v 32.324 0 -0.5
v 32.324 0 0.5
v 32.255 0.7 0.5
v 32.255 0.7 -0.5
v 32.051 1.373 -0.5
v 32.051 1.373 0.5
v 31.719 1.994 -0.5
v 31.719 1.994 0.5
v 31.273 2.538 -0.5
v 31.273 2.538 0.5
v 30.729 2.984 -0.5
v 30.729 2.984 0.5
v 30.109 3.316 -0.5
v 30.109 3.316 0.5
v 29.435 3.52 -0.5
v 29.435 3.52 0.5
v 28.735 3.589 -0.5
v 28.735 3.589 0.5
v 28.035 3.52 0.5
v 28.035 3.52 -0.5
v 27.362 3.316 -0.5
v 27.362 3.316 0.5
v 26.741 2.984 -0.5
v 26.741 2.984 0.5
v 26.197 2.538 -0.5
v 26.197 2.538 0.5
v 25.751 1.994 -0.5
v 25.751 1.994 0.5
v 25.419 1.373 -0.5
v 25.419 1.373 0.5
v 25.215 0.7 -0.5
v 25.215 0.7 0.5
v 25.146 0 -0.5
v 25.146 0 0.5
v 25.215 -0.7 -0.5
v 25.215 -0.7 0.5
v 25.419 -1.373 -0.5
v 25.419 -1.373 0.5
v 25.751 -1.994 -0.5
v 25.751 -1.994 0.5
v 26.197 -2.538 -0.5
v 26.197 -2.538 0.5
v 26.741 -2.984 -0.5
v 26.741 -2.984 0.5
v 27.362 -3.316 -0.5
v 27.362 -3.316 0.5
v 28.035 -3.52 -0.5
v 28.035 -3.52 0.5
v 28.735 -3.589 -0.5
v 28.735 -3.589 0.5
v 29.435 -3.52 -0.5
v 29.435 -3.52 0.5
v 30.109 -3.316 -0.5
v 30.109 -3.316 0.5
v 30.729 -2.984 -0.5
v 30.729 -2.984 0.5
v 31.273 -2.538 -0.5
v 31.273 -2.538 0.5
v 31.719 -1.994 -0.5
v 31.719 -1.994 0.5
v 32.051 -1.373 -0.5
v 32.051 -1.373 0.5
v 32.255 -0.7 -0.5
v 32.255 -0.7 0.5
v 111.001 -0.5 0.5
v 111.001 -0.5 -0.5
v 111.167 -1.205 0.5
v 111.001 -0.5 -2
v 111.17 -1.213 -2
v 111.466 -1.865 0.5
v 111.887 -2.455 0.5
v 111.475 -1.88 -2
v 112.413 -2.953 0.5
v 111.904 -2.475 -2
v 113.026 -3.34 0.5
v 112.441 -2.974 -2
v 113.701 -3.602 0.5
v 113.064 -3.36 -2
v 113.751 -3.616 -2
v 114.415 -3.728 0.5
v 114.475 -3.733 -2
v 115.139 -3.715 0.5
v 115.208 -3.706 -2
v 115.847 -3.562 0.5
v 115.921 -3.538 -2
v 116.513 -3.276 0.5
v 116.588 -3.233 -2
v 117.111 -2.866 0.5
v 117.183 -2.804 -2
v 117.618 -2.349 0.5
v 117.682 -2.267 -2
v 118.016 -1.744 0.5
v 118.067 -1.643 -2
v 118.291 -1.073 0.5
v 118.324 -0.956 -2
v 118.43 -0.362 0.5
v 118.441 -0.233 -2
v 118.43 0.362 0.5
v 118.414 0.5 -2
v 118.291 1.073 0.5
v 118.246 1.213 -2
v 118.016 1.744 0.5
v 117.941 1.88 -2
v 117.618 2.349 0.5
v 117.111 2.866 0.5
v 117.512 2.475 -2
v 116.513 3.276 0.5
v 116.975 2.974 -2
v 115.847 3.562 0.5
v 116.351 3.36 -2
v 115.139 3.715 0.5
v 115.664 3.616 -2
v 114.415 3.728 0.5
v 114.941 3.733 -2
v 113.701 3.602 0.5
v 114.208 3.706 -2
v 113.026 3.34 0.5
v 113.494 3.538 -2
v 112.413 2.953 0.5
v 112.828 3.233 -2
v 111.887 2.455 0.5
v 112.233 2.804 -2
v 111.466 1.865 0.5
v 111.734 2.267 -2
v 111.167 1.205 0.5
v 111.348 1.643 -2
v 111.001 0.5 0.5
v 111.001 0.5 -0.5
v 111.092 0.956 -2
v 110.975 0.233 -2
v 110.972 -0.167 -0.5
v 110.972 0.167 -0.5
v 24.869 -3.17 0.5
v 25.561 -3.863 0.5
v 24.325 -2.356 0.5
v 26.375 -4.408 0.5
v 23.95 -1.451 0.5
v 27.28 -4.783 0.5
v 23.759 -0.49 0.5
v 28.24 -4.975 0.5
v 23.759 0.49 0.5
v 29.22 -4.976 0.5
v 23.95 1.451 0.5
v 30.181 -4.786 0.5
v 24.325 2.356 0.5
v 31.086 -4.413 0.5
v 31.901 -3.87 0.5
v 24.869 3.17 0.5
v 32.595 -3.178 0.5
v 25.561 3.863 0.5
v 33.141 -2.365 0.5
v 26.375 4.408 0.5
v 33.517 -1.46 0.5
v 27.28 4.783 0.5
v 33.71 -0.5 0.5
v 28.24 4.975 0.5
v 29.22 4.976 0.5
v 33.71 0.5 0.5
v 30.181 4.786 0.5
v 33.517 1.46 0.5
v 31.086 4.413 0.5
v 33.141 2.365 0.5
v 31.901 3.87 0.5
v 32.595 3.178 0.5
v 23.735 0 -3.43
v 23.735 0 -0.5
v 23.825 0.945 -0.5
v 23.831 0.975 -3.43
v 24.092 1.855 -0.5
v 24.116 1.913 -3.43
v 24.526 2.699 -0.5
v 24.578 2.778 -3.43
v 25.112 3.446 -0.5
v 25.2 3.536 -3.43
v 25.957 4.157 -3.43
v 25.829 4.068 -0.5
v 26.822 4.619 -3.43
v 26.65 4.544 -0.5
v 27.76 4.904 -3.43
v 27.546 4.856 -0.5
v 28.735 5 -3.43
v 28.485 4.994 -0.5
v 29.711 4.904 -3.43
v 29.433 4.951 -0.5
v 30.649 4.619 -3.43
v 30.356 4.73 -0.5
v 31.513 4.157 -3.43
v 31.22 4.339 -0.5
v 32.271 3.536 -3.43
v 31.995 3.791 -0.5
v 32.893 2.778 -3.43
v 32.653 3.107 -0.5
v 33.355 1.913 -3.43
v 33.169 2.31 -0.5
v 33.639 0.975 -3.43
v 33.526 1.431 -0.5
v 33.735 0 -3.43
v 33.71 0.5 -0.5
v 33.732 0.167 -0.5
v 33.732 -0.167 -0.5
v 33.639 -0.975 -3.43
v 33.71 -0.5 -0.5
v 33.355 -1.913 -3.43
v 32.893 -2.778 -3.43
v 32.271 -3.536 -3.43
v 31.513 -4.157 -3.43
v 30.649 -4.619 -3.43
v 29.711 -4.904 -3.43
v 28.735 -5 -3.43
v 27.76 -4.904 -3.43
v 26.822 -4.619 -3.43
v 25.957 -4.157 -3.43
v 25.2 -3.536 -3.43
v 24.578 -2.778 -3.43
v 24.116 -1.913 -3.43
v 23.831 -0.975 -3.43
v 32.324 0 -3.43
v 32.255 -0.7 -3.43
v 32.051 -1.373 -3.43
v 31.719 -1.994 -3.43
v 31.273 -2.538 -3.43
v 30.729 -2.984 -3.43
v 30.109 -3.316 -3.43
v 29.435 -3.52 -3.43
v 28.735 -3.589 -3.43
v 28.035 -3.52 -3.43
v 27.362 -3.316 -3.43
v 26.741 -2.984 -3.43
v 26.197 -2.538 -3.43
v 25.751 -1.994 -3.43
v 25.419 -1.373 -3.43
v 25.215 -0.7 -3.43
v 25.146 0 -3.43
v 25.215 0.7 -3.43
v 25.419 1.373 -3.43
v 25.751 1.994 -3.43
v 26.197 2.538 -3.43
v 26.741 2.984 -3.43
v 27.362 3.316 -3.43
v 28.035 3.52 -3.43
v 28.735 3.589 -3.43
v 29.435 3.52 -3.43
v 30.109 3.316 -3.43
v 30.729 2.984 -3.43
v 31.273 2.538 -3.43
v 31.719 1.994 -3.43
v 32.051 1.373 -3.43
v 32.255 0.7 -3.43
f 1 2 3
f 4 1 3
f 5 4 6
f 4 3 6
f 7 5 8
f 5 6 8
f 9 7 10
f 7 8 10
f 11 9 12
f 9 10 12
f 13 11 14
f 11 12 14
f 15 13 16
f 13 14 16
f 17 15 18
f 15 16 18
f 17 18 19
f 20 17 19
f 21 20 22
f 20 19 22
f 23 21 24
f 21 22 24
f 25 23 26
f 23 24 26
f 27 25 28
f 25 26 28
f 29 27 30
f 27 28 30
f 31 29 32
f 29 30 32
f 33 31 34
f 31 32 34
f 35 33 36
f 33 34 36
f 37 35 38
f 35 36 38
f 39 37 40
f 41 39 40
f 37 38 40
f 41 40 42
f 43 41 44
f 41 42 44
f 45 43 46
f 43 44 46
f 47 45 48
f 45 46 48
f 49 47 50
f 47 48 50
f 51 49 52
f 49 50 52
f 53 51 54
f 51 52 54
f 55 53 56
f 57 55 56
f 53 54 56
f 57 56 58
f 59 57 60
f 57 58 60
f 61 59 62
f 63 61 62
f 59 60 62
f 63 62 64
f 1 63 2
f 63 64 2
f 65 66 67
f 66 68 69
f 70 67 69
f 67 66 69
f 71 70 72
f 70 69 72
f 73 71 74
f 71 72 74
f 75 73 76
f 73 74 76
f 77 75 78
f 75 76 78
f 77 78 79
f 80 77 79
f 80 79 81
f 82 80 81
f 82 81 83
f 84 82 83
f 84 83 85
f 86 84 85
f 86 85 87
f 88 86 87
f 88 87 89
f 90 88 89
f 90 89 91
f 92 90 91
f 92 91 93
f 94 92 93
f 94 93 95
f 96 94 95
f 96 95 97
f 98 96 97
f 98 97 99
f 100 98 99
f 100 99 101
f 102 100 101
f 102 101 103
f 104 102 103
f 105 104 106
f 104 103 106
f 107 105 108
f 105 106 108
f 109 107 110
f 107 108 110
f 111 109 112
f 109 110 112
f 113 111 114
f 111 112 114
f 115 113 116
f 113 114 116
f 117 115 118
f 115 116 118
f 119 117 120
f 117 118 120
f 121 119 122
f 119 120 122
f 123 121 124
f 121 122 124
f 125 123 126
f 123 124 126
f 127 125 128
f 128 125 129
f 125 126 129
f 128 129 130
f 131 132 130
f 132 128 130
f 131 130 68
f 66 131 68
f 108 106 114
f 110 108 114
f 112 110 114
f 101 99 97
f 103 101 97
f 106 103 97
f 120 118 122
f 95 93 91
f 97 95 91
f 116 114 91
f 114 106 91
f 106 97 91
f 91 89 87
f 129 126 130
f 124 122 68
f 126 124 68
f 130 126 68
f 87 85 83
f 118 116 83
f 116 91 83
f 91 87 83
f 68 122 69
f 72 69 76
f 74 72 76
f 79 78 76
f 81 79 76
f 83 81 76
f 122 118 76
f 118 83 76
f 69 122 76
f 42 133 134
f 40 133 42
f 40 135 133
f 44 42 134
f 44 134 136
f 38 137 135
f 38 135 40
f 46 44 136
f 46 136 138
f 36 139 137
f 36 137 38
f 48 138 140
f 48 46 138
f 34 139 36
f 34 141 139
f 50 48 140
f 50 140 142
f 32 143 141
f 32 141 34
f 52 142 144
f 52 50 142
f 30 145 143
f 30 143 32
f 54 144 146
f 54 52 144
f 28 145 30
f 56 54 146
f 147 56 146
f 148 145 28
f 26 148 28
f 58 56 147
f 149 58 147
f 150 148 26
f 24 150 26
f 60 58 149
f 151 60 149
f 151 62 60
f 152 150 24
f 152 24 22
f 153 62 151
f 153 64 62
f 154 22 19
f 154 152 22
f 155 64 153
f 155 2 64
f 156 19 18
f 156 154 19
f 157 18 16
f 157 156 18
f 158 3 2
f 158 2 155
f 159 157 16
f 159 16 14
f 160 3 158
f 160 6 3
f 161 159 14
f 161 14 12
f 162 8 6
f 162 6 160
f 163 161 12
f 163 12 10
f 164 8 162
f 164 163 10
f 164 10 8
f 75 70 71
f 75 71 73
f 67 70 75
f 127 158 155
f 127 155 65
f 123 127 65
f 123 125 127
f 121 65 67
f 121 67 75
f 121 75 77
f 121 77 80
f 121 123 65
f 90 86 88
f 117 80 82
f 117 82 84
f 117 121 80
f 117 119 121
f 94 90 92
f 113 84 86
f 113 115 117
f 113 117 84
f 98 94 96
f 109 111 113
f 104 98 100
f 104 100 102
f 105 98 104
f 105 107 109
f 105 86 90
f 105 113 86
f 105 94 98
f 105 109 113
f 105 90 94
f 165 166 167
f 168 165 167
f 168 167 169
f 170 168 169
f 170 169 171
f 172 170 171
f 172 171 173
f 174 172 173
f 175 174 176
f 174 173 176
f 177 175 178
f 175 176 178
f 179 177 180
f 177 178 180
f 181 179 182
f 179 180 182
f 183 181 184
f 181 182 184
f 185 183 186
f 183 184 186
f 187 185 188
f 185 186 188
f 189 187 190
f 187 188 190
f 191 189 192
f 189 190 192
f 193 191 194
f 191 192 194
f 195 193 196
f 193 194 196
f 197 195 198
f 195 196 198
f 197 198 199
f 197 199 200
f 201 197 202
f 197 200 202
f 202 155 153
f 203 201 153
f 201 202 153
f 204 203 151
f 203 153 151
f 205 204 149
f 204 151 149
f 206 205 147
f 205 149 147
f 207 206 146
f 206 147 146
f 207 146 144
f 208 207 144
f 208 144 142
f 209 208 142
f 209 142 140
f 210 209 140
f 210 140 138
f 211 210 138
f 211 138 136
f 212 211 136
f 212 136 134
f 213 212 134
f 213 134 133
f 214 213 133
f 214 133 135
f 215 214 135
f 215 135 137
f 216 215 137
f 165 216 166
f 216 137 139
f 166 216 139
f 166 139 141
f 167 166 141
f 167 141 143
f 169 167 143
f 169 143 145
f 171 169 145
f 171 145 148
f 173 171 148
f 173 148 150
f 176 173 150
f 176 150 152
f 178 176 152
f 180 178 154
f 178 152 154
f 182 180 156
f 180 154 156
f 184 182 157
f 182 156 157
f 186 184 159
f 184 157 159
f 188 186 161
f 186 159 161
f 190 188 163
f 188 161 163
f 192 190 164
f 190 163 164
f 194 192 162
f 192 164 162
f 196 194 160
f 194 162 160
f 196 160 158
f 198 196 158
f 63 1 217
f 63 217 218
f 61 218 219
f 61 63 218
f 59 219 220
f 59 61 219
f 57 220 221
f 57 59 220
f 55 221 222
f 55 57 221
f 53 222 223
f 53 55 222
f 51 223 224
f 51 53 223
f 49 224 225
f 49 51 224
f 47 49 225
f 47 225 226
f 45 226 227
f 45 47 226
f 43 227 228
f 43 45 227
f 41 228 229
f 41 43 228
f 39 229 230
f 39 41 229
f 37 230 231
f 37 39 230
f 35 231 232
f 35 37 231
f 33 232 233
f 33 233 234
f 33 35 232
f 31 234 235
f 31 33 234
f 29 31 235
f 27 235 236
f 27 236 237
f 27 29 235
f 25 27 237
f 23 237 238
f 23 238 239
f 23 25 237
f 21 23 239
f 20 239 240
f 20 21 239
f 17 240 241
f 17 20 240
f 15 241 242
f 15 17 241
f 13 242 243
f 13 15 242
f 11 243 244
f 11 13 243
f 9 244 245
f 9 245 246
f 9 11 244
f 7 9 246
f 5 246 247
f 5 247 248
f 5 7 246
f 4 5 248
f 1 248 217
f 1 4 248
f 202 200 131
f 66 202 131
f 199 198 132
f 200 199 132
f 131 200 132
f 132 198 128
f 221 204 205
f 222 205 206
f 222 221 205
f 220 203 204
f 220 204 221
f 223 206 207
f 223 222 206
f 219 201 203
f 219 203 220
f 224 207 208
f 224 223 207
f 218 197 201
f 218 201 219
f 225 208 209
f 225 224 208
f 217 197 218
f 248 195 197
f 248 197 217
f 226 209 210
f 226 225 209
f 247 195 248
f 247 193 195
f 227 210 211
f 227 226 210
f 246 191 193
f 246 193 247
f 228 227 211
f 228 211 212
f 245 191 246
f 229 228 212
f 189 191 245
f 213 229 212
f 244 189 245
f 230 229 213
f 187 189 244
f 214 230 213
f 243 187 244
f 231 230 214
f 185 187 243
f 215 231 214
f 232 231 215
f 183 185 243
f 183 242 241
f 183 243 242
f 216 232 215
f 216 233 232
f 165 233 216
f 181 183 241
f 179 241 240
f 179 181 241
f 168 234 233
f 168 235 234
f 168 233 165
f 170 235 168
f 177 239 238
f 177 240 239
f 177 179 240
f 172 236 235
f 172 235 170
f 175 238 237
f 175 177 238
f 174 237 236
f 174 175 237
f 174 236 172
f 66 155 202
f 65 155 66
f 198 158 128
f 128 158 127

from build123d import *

# Parameters (mm, degrees)
SKETCH4_W                = 85.972725278
SKETCH4_H                = 1
EXTRUDE_THIN1_DEPTH      = 0.5
SKETCH6_R                = 5
CUT_EXTRUDE1_DEPTH       = 10
BOSS_EXTRUDE2_DEPTH      = 0.5
BOSS_EXTRUDE2_DEPTH_BACK = 5
SKETCH7_R                = 3.739985504
BOSS_EXTRUDE3_START      = -0.5
SKETCH8_R                = 5
SKETCH8_R_2              = 3
BOSS_EXTRUDE3_DEPTH      = 1
MOVE_FACE1_BY            = 2
SKETCH10_R               = 3.589046815
CUT_EXTRUDE4_DEPTH       = 1
MOVE_FACE2_BY            = 5
SKETCH11_R               = 5
SKETCH11_R_2             = 3.589046815
BOSS_EXTRUDE4_DEPTH      = 2.93


with BuildPart() as part:
    # Sketch4 → Extrude-Thin1 (new, symmetric)
    with BuildSketch(Plane.XY):
        with Locations((71.721545049, 0)):
            Rectangle(SKETCH4_W, SKETCH4_H)
    extrude(amount=EXTRUDE_THIN1_DEPTH, both=True)

    # Sketch6 → Cut-Extrude1 (cut)
    with BuildSketch(Plane.XY.offset(0.5)):
        with Locations((28.73518241, 0)):
            Circle(SKETCH6_R)
    extrude(amount=-CUT_EXTRUDE1_DEPTH, mode=Mode.SUBTRACT)

    # Sketch7 → Boss-Extrude2 (add, two sides: drawn at the far end of the back side and taken through both)
    with BuildSketch(Plane.XY.offset(-BOSS_EXTRUDE2_DEPTH_BACK)):
        with Locations(Location((114.707907688, 0, 0), (0, 0, 187.682896446))):
            Circle(SKETCH7_R)
    extrude(amount=BOSS_EXTRUDE2_DEPTH + BOSS_EXTRUDE2_DEPTH_BACK)

    # Sketch8 → Boss-Extrude3 (add)
    with BuildSketch(Plane.XY.offset(BOSS_EXTRUDE3_START)):
        with Locations((28.73518241, 0)):
            Circle(SKETCH8_R)
        with Locations((28.73518241, 0)):
            Circle(SKETCH8_R_2, mode=Mode.SUBTRACT)
    extrude(amount=BOSS_EXTRUDE3_DEPTH)

    # Move Face1: a face moved outward by 2.0
    extrude(part.faces().sort_by_distance((114.707907688, 0, -5))[0], amount=MOVE_FACE1_BY, dir=(0, 0, -1))

    # Sketch10 → Cut-Extrude4 (cut)
    with BuildSketch(Plane.XY.offset(0.5)):
        with Locations((28.73518241, 0)):
            Circle(SKETCH10_R)
    extrude(amount=-CUT_EXTRUDE4_DEPTH, mode=Mode.SUBTRACT)

    # Move Face2: a face moved inward by 5.0
    extrude(part.faces().sort_by_distance((114.707907688, 0, -7))[0], amount=MOVE_FACE2_BY, dir=(0, 0, 1), mode=Mode.SUBTRACT)

    # Sketch11 → Boss-Extrude4 (add)
    with BuildSketch(Plane(origin=(0, 0, -0.5), x_dir=(-1, 0, 0), z_dir=(0, 0, -1))):
        with Locations((-28.73518241, 0)):
            Circle(SKETCH11_R)
        with Locations(Location((-28.73518241, 0, 0), (0, 0, 180))):
            Circle(SKETCH11_R_2, mode=Mode.SUBTRACT)
    extrude(amount=BOSS_EXTRUDE4_DEPTH)


solid = part.part
